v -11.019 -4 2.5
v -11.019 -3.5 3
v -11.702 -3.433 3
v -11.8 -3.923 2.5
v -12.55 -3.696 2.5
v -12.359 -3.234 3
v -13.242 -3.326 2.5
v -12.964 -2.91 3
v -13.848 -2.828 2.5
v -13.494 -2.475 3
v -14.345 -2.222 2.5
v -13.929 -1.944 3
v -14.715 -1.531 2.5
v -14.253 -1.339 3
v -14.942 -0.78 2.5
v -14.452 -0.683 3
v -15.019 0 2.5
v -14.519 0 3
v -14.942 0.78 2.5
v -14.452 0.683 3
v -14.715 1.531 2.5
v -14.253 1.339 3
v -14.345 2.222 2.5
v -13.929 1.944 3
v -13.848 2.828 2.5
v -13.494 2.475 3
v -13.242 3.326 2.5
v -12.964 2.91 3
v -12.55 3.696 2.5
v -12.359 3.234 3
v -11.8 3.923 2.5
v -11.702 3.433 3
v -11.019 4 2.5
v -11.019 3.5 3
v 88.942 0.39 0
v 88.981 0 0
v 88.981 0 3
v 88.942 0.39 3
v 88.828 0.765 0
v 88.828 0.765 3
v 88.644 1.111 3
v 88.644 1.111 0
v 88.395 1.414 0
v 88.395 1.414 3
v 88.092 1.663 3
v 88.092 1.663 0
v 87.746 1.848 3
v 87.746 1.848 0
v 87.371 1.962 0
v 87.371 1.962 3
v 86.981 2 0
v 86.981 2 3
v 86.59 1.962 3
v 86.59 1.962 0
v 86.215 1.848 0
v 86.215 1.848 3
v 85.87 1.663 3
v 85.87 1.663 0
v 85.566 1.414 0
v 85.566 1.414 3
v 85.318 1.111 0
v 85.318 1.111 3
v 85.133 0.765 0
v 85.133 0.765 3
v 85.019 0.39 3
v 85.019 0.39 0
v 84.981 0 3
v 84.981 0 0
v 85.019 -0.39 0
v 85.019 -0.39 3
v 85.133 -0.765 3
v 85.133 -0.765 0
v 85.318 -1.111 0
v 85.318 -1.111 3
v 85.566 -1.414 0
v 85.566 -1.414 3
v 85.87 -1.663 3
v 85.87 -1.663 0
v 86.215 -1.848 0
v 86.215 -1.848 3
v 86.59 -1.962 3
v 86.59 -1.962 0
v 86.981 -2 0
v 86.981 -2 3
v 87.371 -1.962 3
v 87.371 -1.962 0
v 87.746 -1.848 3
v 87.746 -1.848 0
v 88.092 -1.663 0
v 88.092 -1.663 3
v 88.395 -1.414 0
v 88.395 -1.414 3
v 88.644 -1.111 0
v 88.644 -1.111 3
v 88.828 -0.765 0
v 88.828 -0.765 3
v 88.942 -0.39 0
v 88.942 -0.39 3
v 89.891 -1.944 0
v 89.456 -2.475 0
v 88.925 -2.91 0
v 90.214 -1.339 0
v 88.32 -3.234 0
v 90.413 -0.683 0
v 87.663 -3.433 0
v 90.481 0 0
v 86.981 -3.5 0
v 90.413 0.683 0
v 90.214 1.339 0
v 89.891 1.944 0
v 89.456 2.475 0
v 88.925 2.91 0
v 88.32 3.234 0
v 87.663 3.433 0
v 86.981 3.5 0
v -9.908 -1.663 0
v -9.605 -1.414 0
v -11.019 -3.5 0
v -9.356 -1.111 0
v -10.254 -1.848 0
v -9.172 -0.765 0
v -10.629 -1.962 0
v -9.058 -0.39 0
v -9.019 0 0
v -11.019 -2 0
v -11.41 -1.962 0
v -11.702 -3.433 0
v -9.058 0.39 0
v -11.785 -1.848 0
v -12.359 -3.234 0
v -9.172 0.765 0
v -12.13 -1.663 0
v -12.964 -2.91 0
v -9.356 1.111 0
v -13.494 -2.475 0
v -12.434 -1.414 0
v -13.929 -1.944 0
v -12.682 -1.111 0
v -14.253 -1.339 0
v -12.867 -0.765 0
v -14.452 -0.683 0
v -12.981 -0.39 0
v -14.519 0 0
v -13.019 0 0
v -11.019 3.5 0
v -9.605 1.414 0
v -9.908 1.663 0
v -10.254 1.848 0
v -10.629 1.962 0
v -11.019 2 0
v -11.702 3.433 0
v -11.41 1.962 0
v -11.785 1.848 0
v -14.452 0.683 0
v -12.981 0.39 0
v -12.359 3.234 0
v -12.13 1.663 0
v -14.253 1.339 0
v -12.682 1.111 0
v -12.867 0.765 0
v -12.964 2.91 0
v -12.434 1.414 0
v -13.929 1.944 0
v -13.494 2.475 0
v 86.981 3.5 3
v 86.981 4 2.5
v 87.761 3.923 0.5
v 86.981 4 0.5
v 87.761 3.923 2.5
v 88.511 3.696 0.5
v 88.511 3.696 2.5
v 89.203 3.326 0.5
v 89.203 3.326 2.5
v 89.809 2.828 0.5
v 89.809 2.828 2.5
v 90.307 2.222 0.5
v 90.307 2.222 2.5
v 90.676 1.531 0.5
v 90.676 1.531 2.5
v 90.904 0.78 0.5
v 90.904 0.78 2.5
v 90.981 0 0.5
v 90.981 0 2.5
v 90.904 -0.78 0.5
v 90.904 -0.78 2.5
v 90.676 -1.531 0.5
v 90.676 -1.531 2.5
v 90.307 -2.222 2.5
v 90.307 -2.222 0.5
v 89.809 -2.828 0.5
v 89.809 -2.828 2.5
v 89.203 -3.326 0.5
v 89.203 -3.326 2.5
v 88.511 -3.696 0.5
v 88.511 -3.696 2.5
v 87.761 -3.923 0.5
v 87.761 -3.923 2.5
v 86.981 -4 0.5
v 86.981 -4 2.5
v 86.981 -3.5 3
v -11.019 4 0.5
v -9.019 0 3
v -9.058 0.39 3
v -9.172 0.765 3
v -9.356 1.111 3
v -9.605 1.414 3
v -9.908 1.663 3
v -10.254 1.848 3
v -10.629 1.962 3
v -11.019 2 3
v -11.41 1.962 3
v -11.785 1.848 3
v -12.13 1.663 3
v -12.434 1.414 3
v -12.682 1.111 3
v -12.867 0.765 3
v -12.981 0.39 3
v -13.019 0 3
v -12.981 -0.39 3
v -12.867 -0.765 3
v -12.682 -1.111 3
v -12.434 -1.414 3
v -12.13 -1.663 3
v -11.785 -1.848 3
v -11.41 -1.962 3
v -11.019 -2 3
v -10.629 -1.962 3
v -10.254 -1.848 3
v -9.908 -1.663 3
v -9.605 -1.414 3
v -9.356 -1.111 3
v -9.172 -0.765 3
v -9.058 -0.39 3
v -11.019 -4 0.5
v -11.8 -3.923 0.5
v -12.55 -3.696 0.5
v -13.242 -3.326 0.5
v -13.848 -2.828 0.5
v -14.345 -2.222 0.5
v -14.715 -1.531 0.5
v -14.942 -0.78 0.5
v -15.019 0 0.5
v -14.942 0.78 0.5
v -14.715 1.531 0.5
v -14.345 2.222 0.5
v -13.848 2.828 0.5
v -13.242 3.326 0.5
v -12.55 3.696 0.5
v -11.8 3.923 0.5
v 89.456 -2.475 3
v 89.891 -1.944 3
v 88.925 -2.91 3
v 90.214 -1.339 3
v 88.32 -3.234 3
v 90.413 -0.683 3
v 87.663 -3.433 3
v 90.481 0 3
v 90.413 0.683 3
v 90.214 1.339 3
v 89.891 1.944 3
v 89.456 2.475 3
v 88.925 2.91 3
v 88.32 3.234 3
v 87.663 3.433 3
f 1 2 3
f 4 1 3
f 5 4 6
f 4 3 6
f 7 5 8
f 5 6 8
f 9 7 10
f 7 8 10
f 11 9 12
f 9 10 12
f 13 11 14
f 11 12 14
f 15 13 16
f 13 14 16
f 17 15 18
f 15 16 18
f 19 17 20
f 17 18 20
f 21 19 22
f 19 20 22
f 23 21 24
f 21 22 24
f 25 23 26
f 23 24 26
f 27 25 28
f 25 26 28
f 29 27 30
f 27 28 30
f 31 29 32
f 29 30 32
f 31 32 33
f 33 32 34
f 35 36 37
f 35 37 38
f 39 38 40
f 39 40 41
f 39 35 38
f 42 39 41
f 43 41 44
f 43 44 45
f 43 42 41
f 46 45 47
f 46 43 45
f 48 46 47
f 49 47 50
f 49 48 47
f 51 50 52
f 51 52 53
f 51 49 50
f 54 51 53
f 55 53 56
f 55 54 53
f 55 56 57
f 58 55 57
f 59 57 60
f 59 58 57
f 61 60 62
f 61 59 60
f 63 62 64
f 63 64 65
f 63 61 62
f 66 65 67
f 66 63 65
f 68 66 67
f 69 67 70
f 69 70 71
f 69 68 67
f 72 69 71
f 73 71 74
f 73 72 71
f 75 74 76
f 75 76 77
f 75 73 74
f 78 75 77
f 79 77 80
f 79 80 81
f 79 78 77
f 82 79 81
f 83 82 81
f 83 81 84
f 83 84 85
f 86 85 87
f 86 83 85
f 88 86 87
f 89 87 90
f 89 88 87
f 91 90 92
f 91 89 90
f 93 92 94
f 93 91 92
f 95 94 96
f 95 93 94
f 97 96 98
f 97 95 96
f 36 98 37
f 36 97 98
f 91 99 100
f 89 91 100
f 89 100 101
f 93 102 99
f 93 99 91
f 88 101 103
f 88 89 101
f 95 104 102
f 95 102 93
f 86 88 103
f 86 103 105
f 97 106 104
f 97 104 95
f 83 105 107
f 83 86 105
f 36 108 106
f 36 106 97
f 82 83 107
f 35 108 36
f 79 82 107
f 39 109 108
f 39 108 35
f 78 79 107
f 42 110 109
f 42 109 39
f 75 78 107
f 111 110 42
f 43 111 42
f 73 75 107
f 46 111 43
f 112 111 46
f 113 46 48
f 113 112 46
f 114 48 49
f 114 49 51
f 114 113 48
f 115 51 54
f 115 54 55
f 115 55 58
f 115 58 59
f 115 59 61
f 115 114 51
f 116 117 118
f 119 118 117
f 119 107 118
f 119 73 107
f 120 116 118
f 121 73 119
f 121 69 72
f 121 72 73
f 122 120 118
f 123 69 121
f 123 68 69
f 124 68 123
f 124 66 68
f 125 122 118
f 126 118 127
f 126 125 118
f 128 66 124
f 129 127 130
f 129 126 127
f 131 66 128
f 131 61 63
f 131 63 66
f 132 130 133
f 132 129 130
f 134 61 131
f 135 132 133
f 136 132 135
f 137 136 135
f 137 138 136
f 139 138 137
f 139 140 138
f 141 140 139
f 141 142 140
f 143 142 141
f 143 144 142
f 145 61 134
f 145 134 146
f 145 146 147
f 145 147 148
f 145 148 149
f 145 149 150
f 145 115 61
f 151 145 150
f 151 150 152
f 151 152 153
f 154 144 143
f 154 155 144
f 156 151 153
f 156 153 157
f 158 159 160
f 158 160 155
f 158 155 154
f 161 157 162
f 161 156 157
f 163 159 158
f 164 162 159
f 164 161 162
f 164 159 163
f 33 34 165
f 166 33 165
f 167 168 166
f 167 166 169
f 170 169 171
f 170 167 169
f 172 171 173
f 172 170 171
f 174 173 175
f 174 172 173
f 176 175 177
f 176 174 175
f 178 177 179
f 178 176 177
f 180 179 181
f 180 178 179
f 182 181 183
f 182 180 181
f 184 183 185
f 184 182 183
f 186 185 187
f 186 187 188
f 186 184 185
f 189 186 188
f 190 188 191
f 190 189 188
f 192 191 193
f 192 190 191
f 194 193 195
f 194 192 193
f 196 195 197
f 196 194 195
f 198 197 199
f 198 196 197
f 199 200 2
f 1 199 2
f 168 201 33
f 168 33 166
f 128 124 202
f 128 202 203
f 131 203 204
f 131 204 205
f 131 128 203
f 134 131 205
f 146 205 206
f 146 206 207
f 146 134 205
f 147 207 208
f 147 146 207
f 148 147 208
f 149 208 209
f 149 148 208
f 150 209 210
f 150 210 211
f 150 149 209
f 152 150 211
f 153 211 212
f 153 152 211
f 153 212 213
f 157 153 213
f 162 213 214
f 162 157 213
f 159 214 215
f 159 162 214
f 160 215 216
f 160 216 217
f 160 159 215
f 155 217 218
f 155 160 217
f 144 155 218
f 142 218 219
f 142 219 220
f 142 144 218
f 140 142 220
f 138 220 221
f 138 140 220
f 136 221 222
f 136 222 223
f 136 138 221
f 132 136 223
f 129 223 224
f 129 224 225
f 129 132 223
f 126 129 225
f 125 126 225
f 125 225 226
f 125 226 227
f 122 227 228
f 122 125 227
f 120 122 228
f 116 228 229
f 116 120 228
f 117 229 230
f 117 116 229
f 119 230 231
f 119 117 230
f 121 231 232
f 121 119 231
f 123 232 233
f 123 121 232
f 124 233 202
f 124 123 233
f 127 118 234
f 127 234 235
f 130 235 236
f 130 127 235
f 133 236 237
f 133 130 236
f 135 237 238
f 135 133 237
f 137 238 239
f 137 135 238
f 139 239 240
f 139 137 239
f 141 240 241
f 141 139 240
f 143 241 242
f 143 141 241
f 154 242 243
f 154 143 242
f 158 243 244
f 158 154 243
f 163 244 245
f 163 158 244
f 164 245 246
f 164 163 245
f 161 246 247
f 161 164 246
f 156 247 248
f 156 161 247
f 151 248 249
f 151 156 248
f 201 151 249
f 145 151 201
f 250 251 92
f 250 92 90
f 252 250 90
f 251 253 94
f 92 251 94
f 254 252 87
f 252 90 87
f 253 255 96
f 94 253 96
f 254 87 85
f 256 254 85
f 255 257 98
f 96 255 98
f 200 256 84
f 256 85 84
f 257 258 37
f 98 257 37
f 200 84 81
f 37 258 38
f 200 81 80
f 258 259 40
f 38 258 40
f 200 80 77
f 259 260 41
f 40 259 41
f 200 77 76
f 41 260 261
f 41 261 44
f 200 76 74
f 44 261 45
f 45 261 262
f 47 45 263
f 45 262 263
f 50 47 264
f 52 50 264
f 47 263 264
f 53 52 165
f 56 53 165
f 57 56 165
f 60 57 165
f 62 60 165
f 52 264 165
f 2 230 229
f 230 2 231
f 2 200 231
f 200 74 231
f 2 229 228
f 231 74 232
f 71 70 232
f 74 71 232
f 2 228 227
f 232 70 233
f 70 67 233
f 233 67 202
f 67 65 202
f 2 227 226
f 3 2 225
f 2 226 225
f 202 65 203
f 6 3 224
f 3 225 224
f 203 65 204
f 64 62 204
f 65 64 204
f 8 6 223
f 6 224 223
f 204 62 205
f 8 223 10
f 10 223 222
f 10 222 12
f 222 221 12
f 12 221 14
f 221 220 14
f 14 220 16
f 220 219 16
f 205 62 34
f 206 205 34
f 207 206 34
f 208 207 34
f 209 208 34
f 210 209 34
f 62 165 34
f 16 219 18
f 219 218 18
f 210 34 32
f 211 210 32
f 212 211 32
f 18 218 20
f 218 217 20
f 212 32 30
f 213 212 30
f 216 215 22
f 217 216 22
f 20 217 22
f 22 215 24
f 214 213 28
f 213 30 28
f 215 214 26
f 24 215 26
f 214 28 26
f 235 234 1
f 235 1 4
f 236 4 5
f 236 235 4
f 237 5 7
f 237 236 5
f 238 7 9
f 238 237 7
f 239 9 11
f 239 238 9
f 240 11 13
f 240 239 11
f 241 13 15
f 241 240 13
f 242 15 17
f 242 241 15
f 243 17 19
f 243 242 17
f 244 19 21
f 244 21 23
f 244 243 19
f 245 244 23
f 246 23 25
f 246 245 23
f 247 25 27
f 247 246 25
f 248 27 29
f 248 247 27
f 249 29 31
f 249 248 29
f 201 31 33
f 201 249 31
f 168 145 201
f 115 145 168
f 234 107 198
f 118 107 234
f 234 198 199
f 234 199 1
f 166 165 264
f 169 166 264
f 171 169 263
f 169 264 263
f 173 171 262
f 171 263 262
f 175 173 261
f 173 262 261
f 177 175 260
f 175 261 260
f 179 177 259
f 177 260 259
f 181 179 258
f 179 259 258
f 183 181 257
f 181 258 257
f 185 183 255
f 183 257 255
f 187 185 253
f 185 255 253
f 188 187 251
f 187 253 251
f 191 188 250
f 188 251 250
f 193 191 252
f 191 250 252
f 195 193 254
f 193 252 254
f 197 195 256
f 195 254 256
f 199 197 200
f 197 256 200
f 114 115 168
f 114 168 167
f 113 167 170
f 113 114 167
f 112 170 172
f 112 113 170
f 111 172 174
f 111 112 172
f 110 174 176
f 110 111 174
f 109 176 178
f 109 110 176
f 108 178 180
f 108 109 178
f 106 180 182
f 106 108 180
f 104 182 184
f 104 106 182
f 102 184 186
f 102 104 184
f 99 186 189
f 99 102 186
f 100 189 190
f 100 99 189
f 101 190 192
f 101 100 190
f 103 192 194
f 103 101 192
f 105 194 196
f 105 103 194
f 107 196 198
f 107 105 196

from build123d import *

# Parameters (mm, degrees)
SKETCH1_R           = 2
BOSS_EXTRUDE1_DEPTH = 3
CHAMFER1_SIZE       = 0.5


with BuildPart() as part:
    # Sketch1 → Boss-Extrude1 (new body)
    with BuildSketch(Plane.XY):
        with BuildLine():
            Line((-11.019354839, 4), (86.980645161, 4))
            ThreePointArc((86.980645161, 4), (90.980645161, 0), (86.980645161, -4))
            Line((86.980645161, -4), (-11.019354839, -4))
            ThreePointArc((-11.019354839, -4), (-15.019354839, 0), (-11.019354839, 4))
        make_face()
        with Locations((-11.019354839, 0)):
            Circle(SKETCH1_R, mode=Mode.SUBTRACT)
        with Locations((86.980645161, 0)):
            Circle(SKETCH1_R, mode=Mode.SUBTRACT)
    extrude(amount=BOSS_EXTRUDE1_DEPTH)

    # Chamfer1
    chamfer1_edges = [part.edges().sort_by_distance(p)[0] for p in [
        (90.980645161, 0, 3),
        (37.980645161, 4, 3),
        (-15.019354839, 0, 3),
        (37.980645161, 4, 0),
        (90.980645161, 0, 0),
        (37.980645161, -4, 0),
        (-15.019354839, 0, 0),
        (37.980645161, -4, 3),
    ]]
    chamfer(chamfer1_edges, length=CHAMFER1_SIZE)


solid = part.part
